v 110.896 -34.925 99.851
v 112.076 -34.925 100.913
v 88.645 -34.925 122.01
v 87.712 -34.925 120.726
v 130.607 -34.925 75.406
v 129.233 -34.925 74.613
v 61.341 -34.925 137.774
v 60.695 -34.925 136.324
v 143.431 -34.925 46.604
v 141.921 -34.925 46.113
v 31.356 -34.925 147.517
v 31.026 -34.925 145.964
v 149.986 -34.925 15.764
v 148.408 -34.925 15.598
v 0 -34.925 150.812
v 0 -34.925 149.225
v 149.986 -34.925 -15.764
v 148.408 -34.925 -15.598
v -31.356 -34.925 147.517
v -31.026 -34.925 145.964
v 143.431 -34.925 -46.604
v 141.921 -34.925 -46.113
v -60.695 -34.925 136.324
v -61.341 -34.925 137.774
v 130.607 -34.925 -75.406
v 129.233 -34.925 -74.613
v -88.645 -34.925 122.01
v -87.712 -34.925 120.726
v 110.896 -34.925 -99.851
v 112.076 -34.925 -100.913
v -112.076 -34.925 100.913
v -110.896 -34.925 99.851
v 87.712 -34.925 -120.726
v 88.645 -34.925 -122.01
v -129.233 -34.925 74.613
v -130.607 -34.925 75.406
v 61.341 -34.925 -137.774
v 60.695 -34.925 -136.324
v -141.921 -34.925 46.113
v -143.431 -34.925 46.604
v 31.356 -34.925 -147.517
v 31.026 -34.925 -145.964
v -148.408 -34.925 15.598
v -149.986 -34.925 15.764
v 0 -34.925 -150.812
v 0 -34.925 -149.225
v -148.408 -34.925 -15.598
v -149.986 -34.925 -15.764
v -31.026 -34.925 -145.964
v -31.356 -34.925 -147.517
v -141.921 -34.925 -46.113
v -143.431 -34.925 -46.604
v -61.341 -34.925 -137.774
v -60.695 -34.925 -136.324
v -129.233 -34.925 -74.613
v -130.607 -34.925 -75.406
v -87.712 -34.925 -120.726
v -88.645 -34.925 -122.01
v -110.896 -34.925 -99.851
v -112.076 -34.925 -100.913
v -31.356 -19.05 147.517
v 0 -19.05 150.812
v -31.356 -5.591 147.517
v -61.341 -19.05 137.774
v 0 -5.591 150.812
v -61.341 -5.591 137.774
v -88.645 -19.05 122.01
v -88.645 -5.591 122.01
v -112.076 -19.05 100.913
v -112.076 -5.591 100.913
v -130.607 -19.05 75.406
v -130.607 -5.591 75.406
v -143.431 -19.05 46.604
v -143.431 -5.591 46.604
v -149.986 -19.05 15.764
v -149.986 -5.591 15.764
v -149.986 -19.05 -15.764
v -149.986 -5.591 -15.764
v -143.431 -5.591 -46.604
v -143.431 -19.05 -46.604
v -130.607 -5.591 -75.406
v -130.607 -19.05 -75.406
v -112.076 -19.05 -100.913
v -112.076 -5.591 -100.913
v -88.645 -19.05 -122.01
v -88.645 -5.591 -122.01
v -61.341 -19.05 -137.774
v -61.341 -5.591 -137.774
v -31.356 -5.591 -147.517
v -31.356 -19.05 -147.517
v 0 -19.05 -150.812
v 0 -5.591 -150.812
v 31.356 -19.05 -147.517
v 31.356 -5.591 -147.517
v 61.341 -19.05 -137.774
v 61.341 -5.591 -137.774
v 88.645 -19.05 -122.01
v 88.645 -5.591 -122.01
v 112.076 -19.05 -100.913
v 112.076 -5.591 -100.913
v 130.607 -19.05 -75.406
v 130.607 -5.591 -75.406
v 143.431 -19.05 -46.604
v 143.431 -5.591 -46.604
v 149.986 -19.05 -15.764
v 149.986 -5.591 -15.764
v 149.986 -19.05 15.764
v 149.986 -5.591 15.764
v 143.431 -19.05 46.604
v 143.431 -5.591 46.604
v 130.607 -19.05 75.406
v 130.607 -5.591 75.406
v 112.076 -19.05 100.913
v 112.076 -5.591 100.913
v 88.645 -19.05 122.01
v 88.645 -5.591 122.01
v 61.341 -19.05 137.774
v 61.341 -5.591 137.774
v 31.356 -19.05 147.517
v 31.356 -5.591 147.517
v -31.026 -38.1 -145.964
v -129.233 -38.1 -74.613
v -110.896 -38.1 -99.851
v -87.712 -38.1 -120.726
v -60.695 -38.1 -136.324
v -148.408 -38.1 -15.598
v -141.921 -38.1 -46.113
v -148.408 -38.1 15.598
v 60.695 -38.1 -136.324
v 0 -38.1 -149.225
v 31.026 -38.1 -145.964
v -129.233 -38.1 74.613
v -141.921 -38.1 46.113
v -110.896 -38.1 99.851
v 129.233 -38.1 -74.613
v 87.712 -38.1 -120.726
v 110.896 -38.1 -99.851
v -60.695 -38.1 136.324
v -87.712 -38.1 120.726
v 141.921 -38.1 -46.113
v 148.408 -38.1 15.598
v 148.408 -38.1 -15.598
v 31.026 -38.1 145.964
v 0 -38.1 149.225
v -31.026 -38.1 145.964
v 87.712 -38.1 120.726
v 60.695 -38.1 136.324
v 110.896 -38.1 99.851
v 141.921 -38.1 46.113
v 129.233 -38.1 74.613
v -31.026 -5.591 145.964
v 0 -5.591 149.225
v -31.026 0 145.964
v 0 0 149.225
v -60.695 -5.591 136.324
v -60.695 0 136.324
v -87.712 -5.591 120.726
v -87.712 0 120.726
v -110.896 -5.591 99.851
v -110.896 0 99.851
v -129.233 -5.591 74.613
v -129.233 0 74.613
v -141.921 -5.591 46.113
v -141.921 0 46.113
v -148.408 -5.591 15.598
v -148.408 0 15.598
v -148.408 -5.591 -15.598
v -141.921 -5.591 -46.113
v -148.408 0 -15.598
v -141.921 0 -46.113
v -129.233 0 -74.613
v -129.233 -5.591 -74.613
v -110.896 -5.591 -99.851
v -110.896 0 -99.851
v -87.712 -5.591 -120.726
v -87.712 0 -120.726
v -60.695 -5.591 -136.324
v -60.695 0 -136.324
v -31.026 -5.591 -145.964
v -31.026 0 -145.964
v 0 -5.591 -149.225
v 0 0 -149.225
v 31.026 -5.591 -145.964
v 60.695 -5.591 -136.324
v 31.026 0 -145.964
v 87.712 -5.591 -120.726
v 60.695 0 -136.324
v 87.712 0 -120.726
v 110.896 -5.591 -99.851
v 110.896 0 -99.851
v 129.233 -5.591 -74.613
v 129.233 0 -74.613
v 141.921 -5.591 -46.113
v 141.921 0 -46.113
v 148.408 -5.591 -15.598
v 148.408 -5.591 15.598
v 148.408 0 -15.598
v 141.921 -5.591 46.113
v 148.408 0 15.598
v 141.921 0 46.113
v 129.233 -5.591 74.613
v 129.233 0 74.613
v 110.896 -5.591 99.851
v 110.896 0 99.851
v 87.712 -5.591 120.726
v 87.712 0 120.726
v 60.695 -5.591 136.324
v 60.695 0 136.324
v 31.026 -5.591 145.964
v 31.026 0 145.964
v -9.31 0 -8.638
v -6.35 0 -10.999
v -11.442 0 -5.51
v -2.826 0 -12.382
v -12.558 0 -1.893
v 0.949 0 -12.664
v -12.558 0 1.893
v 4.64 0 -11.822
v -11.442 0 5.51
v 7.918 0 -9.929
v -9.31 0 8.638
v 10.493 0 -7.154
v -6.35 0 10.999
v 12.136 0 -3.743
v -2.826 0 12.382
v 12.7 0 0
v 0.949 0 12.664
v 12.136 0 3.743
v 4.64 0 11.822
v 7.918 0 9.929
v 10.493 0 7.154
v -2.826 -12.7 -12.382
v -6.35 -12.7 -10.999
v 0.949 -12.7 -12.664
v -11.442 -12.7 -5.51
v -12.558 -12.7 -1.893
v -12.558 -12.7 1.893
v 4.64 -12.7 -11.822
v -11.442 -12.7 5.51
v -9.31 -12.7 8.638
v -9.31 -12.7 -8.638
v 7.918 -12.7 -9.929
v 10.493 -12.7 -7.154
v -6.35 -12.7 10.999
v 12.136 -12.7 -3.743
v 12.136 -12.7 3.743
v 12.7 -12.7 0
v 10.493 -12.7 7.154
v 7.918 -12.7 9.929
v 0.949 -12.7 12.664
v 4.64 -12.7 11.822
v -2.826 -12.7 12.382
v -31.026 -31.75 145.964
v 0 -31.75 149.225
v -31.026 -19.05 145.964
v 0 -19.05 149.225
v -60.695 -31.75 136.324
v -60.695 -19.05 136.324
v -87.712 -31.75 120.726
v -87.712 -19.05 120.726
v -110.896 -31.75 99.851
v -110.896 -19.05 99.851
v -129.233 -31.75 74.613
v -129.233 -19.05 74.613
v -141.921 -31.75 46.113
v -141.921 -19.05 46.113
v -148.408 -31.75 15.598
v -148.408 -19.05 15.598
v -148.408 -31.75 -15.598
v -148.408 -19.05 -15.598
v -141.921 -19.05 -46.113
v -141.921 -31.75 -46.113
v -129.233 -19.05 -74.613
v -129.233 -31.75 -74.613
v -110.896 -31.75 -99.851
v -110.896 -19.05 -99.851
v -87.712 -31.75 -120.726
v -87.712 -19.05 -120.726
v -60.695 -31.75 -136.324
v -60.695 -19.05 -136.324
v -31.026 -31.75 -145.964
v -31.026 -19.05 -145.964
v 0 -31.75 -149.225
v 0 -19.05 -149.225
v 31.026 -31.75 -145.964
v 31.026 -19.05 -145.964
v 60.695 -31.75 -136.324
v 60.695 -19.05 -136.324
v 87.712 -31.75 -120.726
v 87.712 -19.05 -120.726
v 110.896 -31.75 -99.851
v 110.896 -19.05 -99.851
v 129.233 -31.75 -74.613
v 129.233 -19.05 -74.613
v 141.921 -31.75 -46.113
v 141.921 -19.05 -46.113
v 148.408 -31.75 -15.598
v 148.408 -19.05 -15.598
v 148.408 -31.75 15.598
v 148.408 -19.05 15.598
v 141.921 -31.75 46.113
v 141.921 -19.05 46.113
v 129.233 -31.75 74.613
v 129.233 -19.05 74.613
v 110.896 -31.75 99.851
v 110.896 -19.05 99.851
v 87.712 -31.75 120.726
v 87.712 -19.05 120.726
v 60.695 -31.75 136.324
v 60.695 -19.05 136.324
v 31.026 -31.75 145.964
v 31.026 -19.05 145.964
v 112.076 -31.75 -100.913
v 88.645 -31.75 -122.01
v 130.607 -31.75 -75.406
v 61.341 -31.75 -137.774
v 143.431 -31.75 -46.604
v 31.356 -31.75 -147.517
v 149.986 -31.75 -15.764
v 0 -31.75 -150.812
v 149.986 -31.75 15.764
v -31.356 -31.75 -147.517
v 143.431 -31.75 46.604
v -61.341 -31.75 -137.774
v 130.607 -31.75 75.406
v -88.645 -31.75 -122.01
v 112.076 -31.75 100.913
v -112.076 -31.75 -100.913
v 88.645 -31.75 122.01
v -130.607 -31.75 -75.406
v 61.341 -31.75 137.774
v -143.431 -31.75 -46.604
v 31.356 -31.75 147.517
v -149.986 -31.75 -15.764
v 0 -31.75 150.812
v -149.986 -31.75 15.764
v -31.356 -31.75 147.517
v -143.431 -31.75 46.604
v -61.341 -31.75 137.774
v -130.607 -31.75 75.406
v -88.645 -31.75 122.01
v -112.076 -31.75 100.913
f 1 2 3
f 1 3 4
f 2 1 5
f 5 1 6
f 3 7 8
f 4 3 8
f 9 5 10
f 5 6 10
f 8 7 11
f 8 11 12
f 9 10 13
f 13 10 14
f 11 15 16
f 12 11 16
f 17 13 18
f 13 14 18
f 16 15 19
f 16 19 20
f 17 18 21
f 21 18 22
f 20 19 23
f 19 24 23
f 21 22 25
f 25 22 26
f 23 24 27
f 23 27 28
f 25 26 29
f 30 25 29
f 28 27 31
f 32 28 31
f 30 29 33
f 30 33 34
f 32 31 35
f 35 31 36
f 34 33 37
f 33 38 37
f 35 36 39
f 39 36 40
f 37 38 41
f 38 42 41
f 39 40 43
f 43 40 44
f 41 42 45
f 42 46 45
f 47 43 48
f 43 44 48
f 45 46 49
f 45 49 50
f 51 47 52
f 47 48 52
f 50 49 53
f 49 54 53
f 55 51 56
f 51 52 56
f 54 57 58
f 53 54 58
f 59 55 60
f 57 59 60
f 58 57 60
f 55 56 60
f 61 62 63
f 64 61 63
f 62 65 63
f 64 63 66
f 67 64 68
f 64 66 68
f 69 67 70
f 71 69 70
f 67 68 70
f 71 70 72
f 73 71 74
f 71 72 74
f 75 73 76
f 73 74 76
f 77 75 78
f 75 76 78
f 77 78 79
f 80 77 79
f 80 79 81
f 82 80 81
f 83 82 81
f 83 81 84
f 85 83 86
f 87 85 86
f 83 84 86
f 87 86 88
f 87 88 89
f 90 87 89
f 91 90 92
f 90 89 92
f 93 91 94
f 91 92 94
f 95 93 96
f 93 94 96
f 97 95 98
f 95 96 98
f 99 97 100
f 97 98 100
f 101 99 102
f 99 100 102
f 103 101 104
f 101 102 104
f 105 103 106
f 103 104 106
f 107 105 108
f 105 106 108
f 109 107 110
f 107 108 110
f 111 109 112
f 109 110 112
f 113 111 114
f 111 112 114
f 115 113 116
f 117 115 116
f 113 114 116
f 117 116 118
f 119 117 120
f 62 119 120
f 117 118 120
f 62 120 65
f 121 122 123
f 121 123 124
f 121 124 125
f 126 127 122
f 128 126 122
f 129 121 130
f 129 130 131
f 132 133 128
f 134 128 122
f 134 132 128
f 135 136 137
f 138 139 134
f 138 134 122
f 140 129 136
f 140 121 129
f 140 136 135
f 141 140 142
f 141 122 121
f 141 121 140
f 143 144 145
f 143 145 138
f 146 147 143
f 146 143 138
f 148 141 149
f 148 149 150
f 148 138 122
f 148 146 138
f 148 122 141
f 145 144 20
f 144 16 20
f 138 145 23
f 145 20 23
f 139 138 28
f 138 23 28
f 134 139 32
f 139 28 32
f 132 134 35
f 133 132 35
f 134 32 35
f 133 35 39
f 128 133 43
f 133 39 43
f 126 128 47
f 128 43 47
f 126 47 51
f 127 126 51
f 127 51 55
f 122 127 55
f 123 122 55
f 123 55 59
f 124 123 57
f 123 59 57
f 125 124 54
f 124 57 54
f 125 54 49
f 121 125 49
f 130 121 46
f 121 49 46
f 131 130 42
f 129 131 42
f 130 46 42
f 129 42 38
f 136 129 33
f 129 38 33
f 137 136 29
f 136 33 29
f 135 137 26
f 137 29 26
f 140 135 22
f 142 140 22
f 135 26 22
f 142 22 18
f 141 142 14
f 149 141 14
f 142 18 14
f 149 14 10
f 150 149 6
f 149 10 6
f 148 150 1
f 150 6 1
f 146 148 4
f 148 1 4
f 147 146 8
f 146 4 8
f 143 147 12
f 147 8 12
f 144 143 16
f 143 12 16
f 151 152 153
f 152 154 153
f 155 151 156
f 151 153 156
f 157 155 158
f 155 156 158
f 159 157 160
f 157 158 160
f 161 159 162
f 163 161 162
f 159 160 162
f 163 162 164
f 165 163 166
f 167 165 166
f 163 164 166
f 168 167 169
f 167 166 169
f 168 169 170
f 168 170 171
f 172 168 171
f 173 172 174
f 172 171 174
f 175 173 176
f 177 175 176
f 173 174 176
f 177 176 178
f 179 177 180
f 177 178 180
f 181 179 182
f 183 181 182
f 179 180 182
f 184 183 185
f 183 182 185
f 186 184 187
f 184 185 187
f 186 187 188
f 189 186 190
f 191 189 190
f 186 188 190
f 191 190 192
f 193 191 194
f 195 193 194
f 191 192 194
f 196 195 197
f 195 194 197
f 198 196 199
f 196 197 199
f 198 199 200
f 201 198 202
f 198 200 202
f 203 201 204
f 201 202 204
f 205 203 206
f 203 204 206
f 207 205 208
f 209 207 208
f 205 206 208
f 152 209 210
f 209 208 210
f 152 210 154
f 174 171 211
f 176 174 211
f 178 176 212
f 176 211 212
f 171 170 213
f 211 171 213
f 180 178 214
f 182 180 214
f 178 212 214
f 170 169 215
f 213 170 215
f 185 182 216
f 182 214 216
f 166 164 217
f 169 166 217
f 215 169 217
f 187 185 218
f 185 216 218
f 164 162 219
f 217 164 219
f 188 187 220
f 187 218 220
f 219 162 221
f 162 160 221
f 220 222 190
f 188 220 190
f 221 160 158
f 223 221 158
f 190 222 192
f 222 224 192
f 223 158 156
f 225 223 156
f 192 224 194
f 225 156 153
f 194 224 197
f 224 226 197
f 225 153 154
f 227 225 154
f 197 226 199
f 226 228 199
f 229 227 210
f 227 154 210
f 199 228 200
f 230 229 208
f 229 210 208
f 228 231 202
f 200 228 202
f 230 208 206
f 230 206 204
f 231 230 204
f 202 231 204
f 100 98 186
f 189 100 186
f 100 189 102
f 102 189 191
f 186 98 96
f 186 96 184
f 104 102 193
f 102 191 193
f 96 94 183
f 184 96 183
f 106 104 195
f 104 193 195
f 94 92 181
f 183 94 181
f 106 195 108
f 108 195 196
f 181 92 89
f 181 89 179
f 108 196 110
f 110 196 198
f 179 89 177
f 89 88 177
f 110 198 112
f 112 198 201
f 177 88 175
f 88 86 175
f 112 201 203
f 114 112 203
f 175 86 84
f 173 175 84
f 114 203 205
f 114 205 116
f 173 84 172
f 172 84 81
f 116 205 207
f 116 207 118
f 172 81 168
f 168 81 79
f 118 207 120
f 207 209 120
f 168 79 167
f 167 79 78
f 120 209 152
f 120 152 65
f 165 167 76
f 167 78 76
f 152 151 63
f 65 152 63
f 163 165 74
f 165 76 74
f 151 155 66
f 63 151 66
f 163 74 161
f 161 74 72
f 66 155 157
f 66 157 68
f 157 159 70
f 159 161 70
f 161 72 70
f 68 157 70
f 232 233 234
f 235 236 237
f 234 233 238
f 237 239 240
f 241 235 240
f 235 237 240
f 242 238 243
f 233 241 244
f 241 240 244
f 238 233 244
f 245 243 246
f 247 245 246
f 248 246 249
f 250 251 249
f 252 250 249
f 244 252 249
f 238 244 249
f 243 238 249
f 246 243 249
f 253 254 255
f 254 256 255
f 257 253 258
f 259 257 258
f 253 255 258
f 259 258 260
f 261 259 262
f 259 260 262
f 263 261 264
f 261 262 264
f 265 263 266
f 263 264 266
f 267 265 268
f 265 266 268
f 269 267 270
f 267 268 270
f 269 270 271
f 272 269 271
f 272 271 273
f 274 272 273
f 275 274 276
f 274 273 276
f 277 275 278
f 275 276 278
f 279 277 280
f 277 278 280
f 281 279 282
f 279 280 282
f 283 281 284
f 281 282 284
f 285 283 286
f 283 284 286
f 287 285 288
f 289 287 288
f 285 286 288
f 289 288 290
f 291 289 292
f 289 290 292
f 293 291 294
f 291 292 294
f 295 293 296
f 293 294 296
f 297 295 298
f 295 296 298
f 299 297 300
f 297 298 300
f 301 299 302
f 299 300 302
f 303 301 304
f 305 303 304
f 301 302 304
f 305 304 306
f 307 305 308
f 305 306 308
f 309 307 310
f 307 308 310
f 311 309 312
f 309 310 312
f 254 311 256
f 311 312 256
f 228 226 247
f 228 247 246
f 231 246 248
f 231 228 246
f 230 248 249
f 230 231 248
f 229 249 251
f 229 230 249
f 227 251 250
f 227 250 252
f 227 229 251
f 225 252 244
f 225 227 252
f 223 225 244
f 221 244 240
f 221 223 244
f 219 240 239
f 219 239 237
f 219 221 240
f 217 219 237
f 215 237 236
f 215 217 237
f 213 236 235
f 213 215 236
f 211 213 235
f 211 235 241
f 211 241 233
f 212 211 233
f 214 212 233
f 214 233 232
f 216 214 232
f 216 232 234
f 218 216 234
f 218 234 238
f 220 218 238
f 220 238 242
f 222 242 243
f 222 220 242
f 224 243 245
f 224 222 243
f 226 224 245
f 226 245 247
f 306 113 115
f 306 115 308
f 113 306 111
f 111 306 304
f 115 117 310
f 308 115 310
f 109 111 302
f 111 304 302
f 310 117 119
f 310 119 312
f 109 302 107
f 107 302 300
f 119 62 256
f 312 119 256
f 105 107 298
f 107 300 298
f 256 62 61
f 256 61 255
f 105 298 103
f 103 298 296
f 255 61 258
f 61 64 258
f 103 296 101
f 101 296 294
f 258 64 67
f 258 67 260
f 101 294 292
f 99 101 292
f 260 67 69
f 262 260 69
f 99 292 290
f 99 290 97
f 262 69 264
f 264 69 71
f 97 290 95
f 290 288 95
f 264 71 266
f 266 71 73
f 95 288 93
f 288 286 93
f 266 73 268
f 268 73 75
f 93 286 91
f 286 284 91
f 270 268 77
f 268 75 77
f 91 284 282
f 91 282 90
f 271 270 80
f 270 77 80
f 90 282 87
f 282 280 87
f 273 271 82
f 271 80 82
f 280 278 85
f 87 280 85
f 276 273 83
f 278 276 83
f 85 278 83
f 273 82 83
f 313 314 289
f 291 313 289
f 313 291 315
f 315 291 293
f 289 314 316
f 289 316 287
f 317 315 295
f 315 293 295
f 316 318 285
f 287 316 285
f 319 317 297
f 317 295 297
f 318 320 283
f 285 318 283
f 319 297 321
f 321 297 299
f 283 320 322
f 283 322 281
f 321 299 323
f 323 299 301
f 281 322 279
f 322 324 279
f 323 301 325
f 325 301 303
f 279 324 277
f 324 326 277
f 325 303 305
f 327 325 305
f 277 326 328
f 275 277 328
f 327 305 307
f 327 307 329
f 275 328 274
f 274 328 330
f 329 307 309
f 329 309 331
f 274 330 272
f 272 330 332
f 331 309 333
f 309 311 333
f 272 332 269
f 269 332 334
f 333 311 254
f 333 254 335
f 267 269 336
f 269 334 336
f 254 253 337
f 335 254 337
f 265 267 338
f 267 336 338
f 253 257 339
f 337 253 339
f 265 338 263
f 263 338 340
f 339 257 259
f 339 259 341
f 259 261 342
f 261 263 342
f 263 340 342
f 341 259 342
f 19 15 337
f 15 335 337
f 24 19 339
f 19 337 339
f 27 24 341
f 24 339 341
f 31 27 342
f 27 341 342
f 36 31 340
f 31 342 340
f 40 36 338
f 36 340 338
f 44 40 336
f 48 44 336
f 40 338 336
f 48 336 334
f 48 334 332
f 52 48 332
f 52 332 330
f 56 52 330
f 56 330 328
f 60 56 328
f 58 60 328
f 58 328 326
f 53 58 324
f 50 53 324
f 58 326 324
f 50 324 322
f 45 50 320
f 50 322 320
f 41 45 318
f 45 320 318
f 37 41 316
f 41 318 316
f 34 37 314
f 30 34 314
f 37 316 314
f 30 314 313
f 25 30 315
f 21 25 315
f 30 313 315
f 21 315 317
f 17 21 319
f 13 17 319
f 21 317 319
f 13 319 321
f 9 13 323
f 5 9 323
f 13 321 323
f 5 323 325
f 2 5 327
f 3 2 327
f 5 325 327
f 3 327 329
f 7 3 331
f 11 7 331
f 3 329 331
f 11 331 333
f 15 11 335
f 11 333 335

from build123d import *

# Parameters (mm, degrees)
F0_R     = 152.4
F1_DEPTH = 38.1
F4_R     = 12.7
F5_DEPTH = 12.7


with BuildPart() as f1:
    # F0 (on Front) → F1 (new body)
    with BuildSketch(Plane.XZ):
        Circle(F0_R)
    extrude(amount=F1_DEPTH)

    # F2 (on Right) → F3 (revolve, cut)
    with BuildSketch(Plane.YZ):
        Polygon((-38.1, 152.908), (-38.1, 149.225), (-34.925, 149.225), (-34.925, 150.8125), (-31.75, 150.8125), (-31.75, 149.225), (-19.05, 149.225), (-19.05, 150.8125), (-5.591471, 150.8125), (-5.591471, 149.225), (0, 149.225), (0, 152.908), align=None)
    revolve(axis=Axis((0, -26.635785, 0), (0, -1, 0)), mode=Mode.SUBTRACT)

    # F4 (on face) → F5 (cut)
    with BuildSketch(Plane.XZ):
        Circle(F4_R)
    extrude(amount=F5_DEPTH, mode=Mode.SUBTRACT)


solid = f1.part
